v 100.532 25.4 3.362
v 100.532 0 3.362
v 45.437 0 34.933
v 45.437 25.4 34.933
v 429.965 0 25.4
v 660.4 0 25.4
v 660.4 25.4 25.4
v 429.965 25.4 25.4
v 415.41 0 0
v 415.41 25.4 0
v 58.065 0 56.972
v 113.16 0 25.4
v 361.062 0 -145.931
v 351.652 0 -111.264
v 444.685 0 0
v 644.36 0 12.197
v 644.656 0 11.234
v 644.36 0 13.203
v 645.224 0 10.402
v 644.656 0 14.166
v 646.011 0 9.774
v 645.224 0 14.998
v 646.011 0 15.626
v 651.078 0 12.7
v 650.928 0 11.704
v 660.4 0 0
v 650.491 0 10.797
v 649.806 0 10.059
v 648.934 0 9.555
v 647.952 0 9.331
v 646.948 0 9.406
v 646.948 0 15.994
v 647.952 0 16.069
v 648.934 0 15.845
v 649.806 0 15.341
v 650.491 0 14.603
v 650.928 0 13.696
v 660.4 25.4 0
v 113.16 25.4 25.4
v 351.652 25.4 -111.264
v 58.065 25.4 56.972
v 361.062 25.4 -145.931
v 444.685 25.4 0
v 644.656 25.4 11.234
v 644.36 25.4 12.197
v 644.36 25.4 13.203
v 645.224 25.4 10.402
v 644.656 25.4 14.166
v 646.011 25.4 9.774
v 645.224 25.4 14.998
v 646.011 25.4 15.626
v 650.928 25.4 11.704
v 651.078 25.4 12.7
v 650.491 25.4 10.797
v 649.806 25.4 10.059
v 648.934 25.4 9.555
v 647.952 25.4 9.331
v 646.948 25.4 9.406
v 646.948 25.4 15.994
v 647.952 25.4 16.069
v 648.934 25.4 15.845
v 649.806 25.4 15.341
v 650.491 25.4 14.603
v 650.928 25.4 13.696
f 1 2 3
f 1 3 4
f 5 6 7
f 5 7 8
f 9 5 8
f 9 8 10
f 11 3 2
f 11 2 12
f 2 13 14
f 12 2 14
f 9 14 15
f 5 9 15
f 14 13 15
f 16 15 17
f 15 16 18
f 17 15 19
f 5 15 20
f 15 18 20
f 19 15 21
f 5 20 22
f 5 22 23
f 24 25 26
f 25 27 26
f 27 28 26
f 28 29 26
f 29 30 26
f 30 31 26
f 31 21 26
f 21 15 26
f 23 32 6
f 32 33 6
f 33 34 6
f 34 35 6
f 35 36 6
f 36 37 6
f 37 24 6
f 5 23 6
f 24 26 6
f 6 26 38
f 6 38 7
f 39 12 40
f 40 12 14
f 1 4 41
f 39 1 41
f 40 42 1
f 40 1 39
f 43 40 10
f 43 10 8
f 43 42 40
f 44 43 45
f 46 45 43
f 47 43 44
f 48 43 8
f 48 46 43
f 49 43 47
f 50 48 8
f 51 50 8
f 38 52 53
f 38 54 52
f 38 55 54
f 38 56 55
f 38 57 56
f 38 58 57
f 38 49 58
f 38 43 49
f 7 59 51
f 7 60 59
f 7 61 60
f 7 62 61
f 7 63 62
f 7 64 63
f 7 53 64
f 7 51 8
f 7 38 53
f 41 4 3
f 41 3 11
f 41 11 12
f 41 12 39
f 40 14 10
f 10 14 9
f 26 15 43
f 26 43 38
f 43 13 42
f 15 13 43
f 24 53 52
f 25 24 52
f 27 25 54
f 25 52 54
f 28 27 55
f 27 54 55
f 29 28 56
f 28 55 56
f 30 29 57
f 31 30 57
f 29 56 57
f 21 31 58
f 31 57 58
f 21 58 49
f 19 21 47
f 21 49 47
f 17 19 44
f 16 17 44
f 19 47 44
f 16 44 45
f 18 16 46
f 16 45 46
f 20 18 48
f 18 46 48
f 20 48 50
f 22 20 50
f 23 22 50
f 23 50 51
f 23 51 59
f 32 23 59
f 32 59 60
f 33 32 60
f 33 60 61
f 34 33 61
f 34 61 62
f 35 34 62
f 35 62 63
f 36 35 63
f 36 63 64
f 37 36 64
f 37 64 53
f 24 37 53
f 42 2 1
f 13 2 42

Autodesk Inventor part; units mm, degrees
ref_plane "YZ Plane" through (0, 0, 0) normal (1, 0, 0) x (0, 1, 0)
ref_plane "XZ Plane" through (0, 0, 0) normal (0, 1, 0) x (-1, 0, 0)
ref_plane "XY Plane" through (0, 0, 0) normal (0, 0, 1) x (1, 0, 0)
sketch "Sketch1" plane through (0, 0, 0) normal (0, 1, 0) x (-1, 0, 0)
  line L0 (-660.4, 0) -> (-660.4, 25.4)
  line L1 (-113.1604, 25.4) -> (-351.652, -111.264)
  line L2 (-351.652, -111.264) -> (-415.4102, 0)
  line L3 (-444.6849, 0) -> (-660.4, 0)
  line L4 (-660.4, 0) -> (-660.4, 25.4)
  line L5 (-660.4, 25.4) -> (-429.9653, 25.4)
  line L6 (-429.9653, 25.4) -> (-415.4102, 0)
  line L7 (-113.1604, 25.4) -> (-100.5318, 3.3619)
  line L8 (-100.5318, 3.3619) -> (-361.0615, -145.9308)
  line L9 (-361.0615, -145.9308) -> (-444.6849, 0)
  line L10 (-660.4, 0) -> (-660.4, 25.4)
  line L11 (-113.1604, 25.4) -> (-351.652, -111.264)
  line L12 (-351.652, -111.264) -> (-415.4102, 0)
  line L13 (-444.6849, 0) -> (-660.4, 0)
  line L14 (-660.4, 0) -> (-660.4, 25.4)
  line L15 (-660.4, 25.4) -> (-429.9653, 25.4)
  line L16 (-429.9653, 25.4) -> (-415.4102, 0)
  line L17 (-113.1604, 25.4) -> (-100.5318, 3.3619)
  line L18 (-100.5318, 3.3619) -> (-361.0615, -145.9308)
  line L19 (-361.0615, -145.9308) -> (-444.6849, 0)
  point P0 (0, 0)
  point P1 (-113.1604, 0)
  point P2 (-113.1604, 0)
  dimension "d0" = 25.4
  dimension "d1" = 25.4
  dimension "d2" = 25.4
  dimension "d3" = 25.4
  dimension "d4" = 25.4
  dimension "d5" = 25.4
extrude "Extrusion1" add sketch "Sketch1" along normal blind 25.4
sketch "Sketch2" plane through (0, 25.4, 0) normal (0, 1, 0) x (1, 0, 0)
  line L0 (660.4, -25.4) -> (660.4, 0) projected
  line L1 (429.9653, -25.4) -> (660.4, -25.4) projected
  line L2 (660.4, -12.7) -> (647.7, -12.7)
  circle A0 centre (647.7, -12.7) radius 3.3782
  point P0 (0, 0)
  dimension "d8" = 12.7
  dimension "d9" = 6.7564
extrude "Extrusion2" cut sketch "Sketch2" against normal blind 25.4
sketch "Sketch3" plane through (113.1604, 0, 25.4) normal (-0.8676421, 0, 0.4971894) x (0.4971894, 0, 0.8676421)
  line L0 (-25.4, 0) -> (0, 0) projected
  line L1 (0, 0) -> (0, 25.4) projected
  line L2 (-25.4, 25.4) -> (0, 25.4) projected
  line L3 (-25.4, 0) -> (-25.4, 25.4) projected
  point P0 (-78.3002, 0)
extrude "Extrusion3" add sketch "Sketch3" along normal blind 63.5
properties part number "bar 3"
